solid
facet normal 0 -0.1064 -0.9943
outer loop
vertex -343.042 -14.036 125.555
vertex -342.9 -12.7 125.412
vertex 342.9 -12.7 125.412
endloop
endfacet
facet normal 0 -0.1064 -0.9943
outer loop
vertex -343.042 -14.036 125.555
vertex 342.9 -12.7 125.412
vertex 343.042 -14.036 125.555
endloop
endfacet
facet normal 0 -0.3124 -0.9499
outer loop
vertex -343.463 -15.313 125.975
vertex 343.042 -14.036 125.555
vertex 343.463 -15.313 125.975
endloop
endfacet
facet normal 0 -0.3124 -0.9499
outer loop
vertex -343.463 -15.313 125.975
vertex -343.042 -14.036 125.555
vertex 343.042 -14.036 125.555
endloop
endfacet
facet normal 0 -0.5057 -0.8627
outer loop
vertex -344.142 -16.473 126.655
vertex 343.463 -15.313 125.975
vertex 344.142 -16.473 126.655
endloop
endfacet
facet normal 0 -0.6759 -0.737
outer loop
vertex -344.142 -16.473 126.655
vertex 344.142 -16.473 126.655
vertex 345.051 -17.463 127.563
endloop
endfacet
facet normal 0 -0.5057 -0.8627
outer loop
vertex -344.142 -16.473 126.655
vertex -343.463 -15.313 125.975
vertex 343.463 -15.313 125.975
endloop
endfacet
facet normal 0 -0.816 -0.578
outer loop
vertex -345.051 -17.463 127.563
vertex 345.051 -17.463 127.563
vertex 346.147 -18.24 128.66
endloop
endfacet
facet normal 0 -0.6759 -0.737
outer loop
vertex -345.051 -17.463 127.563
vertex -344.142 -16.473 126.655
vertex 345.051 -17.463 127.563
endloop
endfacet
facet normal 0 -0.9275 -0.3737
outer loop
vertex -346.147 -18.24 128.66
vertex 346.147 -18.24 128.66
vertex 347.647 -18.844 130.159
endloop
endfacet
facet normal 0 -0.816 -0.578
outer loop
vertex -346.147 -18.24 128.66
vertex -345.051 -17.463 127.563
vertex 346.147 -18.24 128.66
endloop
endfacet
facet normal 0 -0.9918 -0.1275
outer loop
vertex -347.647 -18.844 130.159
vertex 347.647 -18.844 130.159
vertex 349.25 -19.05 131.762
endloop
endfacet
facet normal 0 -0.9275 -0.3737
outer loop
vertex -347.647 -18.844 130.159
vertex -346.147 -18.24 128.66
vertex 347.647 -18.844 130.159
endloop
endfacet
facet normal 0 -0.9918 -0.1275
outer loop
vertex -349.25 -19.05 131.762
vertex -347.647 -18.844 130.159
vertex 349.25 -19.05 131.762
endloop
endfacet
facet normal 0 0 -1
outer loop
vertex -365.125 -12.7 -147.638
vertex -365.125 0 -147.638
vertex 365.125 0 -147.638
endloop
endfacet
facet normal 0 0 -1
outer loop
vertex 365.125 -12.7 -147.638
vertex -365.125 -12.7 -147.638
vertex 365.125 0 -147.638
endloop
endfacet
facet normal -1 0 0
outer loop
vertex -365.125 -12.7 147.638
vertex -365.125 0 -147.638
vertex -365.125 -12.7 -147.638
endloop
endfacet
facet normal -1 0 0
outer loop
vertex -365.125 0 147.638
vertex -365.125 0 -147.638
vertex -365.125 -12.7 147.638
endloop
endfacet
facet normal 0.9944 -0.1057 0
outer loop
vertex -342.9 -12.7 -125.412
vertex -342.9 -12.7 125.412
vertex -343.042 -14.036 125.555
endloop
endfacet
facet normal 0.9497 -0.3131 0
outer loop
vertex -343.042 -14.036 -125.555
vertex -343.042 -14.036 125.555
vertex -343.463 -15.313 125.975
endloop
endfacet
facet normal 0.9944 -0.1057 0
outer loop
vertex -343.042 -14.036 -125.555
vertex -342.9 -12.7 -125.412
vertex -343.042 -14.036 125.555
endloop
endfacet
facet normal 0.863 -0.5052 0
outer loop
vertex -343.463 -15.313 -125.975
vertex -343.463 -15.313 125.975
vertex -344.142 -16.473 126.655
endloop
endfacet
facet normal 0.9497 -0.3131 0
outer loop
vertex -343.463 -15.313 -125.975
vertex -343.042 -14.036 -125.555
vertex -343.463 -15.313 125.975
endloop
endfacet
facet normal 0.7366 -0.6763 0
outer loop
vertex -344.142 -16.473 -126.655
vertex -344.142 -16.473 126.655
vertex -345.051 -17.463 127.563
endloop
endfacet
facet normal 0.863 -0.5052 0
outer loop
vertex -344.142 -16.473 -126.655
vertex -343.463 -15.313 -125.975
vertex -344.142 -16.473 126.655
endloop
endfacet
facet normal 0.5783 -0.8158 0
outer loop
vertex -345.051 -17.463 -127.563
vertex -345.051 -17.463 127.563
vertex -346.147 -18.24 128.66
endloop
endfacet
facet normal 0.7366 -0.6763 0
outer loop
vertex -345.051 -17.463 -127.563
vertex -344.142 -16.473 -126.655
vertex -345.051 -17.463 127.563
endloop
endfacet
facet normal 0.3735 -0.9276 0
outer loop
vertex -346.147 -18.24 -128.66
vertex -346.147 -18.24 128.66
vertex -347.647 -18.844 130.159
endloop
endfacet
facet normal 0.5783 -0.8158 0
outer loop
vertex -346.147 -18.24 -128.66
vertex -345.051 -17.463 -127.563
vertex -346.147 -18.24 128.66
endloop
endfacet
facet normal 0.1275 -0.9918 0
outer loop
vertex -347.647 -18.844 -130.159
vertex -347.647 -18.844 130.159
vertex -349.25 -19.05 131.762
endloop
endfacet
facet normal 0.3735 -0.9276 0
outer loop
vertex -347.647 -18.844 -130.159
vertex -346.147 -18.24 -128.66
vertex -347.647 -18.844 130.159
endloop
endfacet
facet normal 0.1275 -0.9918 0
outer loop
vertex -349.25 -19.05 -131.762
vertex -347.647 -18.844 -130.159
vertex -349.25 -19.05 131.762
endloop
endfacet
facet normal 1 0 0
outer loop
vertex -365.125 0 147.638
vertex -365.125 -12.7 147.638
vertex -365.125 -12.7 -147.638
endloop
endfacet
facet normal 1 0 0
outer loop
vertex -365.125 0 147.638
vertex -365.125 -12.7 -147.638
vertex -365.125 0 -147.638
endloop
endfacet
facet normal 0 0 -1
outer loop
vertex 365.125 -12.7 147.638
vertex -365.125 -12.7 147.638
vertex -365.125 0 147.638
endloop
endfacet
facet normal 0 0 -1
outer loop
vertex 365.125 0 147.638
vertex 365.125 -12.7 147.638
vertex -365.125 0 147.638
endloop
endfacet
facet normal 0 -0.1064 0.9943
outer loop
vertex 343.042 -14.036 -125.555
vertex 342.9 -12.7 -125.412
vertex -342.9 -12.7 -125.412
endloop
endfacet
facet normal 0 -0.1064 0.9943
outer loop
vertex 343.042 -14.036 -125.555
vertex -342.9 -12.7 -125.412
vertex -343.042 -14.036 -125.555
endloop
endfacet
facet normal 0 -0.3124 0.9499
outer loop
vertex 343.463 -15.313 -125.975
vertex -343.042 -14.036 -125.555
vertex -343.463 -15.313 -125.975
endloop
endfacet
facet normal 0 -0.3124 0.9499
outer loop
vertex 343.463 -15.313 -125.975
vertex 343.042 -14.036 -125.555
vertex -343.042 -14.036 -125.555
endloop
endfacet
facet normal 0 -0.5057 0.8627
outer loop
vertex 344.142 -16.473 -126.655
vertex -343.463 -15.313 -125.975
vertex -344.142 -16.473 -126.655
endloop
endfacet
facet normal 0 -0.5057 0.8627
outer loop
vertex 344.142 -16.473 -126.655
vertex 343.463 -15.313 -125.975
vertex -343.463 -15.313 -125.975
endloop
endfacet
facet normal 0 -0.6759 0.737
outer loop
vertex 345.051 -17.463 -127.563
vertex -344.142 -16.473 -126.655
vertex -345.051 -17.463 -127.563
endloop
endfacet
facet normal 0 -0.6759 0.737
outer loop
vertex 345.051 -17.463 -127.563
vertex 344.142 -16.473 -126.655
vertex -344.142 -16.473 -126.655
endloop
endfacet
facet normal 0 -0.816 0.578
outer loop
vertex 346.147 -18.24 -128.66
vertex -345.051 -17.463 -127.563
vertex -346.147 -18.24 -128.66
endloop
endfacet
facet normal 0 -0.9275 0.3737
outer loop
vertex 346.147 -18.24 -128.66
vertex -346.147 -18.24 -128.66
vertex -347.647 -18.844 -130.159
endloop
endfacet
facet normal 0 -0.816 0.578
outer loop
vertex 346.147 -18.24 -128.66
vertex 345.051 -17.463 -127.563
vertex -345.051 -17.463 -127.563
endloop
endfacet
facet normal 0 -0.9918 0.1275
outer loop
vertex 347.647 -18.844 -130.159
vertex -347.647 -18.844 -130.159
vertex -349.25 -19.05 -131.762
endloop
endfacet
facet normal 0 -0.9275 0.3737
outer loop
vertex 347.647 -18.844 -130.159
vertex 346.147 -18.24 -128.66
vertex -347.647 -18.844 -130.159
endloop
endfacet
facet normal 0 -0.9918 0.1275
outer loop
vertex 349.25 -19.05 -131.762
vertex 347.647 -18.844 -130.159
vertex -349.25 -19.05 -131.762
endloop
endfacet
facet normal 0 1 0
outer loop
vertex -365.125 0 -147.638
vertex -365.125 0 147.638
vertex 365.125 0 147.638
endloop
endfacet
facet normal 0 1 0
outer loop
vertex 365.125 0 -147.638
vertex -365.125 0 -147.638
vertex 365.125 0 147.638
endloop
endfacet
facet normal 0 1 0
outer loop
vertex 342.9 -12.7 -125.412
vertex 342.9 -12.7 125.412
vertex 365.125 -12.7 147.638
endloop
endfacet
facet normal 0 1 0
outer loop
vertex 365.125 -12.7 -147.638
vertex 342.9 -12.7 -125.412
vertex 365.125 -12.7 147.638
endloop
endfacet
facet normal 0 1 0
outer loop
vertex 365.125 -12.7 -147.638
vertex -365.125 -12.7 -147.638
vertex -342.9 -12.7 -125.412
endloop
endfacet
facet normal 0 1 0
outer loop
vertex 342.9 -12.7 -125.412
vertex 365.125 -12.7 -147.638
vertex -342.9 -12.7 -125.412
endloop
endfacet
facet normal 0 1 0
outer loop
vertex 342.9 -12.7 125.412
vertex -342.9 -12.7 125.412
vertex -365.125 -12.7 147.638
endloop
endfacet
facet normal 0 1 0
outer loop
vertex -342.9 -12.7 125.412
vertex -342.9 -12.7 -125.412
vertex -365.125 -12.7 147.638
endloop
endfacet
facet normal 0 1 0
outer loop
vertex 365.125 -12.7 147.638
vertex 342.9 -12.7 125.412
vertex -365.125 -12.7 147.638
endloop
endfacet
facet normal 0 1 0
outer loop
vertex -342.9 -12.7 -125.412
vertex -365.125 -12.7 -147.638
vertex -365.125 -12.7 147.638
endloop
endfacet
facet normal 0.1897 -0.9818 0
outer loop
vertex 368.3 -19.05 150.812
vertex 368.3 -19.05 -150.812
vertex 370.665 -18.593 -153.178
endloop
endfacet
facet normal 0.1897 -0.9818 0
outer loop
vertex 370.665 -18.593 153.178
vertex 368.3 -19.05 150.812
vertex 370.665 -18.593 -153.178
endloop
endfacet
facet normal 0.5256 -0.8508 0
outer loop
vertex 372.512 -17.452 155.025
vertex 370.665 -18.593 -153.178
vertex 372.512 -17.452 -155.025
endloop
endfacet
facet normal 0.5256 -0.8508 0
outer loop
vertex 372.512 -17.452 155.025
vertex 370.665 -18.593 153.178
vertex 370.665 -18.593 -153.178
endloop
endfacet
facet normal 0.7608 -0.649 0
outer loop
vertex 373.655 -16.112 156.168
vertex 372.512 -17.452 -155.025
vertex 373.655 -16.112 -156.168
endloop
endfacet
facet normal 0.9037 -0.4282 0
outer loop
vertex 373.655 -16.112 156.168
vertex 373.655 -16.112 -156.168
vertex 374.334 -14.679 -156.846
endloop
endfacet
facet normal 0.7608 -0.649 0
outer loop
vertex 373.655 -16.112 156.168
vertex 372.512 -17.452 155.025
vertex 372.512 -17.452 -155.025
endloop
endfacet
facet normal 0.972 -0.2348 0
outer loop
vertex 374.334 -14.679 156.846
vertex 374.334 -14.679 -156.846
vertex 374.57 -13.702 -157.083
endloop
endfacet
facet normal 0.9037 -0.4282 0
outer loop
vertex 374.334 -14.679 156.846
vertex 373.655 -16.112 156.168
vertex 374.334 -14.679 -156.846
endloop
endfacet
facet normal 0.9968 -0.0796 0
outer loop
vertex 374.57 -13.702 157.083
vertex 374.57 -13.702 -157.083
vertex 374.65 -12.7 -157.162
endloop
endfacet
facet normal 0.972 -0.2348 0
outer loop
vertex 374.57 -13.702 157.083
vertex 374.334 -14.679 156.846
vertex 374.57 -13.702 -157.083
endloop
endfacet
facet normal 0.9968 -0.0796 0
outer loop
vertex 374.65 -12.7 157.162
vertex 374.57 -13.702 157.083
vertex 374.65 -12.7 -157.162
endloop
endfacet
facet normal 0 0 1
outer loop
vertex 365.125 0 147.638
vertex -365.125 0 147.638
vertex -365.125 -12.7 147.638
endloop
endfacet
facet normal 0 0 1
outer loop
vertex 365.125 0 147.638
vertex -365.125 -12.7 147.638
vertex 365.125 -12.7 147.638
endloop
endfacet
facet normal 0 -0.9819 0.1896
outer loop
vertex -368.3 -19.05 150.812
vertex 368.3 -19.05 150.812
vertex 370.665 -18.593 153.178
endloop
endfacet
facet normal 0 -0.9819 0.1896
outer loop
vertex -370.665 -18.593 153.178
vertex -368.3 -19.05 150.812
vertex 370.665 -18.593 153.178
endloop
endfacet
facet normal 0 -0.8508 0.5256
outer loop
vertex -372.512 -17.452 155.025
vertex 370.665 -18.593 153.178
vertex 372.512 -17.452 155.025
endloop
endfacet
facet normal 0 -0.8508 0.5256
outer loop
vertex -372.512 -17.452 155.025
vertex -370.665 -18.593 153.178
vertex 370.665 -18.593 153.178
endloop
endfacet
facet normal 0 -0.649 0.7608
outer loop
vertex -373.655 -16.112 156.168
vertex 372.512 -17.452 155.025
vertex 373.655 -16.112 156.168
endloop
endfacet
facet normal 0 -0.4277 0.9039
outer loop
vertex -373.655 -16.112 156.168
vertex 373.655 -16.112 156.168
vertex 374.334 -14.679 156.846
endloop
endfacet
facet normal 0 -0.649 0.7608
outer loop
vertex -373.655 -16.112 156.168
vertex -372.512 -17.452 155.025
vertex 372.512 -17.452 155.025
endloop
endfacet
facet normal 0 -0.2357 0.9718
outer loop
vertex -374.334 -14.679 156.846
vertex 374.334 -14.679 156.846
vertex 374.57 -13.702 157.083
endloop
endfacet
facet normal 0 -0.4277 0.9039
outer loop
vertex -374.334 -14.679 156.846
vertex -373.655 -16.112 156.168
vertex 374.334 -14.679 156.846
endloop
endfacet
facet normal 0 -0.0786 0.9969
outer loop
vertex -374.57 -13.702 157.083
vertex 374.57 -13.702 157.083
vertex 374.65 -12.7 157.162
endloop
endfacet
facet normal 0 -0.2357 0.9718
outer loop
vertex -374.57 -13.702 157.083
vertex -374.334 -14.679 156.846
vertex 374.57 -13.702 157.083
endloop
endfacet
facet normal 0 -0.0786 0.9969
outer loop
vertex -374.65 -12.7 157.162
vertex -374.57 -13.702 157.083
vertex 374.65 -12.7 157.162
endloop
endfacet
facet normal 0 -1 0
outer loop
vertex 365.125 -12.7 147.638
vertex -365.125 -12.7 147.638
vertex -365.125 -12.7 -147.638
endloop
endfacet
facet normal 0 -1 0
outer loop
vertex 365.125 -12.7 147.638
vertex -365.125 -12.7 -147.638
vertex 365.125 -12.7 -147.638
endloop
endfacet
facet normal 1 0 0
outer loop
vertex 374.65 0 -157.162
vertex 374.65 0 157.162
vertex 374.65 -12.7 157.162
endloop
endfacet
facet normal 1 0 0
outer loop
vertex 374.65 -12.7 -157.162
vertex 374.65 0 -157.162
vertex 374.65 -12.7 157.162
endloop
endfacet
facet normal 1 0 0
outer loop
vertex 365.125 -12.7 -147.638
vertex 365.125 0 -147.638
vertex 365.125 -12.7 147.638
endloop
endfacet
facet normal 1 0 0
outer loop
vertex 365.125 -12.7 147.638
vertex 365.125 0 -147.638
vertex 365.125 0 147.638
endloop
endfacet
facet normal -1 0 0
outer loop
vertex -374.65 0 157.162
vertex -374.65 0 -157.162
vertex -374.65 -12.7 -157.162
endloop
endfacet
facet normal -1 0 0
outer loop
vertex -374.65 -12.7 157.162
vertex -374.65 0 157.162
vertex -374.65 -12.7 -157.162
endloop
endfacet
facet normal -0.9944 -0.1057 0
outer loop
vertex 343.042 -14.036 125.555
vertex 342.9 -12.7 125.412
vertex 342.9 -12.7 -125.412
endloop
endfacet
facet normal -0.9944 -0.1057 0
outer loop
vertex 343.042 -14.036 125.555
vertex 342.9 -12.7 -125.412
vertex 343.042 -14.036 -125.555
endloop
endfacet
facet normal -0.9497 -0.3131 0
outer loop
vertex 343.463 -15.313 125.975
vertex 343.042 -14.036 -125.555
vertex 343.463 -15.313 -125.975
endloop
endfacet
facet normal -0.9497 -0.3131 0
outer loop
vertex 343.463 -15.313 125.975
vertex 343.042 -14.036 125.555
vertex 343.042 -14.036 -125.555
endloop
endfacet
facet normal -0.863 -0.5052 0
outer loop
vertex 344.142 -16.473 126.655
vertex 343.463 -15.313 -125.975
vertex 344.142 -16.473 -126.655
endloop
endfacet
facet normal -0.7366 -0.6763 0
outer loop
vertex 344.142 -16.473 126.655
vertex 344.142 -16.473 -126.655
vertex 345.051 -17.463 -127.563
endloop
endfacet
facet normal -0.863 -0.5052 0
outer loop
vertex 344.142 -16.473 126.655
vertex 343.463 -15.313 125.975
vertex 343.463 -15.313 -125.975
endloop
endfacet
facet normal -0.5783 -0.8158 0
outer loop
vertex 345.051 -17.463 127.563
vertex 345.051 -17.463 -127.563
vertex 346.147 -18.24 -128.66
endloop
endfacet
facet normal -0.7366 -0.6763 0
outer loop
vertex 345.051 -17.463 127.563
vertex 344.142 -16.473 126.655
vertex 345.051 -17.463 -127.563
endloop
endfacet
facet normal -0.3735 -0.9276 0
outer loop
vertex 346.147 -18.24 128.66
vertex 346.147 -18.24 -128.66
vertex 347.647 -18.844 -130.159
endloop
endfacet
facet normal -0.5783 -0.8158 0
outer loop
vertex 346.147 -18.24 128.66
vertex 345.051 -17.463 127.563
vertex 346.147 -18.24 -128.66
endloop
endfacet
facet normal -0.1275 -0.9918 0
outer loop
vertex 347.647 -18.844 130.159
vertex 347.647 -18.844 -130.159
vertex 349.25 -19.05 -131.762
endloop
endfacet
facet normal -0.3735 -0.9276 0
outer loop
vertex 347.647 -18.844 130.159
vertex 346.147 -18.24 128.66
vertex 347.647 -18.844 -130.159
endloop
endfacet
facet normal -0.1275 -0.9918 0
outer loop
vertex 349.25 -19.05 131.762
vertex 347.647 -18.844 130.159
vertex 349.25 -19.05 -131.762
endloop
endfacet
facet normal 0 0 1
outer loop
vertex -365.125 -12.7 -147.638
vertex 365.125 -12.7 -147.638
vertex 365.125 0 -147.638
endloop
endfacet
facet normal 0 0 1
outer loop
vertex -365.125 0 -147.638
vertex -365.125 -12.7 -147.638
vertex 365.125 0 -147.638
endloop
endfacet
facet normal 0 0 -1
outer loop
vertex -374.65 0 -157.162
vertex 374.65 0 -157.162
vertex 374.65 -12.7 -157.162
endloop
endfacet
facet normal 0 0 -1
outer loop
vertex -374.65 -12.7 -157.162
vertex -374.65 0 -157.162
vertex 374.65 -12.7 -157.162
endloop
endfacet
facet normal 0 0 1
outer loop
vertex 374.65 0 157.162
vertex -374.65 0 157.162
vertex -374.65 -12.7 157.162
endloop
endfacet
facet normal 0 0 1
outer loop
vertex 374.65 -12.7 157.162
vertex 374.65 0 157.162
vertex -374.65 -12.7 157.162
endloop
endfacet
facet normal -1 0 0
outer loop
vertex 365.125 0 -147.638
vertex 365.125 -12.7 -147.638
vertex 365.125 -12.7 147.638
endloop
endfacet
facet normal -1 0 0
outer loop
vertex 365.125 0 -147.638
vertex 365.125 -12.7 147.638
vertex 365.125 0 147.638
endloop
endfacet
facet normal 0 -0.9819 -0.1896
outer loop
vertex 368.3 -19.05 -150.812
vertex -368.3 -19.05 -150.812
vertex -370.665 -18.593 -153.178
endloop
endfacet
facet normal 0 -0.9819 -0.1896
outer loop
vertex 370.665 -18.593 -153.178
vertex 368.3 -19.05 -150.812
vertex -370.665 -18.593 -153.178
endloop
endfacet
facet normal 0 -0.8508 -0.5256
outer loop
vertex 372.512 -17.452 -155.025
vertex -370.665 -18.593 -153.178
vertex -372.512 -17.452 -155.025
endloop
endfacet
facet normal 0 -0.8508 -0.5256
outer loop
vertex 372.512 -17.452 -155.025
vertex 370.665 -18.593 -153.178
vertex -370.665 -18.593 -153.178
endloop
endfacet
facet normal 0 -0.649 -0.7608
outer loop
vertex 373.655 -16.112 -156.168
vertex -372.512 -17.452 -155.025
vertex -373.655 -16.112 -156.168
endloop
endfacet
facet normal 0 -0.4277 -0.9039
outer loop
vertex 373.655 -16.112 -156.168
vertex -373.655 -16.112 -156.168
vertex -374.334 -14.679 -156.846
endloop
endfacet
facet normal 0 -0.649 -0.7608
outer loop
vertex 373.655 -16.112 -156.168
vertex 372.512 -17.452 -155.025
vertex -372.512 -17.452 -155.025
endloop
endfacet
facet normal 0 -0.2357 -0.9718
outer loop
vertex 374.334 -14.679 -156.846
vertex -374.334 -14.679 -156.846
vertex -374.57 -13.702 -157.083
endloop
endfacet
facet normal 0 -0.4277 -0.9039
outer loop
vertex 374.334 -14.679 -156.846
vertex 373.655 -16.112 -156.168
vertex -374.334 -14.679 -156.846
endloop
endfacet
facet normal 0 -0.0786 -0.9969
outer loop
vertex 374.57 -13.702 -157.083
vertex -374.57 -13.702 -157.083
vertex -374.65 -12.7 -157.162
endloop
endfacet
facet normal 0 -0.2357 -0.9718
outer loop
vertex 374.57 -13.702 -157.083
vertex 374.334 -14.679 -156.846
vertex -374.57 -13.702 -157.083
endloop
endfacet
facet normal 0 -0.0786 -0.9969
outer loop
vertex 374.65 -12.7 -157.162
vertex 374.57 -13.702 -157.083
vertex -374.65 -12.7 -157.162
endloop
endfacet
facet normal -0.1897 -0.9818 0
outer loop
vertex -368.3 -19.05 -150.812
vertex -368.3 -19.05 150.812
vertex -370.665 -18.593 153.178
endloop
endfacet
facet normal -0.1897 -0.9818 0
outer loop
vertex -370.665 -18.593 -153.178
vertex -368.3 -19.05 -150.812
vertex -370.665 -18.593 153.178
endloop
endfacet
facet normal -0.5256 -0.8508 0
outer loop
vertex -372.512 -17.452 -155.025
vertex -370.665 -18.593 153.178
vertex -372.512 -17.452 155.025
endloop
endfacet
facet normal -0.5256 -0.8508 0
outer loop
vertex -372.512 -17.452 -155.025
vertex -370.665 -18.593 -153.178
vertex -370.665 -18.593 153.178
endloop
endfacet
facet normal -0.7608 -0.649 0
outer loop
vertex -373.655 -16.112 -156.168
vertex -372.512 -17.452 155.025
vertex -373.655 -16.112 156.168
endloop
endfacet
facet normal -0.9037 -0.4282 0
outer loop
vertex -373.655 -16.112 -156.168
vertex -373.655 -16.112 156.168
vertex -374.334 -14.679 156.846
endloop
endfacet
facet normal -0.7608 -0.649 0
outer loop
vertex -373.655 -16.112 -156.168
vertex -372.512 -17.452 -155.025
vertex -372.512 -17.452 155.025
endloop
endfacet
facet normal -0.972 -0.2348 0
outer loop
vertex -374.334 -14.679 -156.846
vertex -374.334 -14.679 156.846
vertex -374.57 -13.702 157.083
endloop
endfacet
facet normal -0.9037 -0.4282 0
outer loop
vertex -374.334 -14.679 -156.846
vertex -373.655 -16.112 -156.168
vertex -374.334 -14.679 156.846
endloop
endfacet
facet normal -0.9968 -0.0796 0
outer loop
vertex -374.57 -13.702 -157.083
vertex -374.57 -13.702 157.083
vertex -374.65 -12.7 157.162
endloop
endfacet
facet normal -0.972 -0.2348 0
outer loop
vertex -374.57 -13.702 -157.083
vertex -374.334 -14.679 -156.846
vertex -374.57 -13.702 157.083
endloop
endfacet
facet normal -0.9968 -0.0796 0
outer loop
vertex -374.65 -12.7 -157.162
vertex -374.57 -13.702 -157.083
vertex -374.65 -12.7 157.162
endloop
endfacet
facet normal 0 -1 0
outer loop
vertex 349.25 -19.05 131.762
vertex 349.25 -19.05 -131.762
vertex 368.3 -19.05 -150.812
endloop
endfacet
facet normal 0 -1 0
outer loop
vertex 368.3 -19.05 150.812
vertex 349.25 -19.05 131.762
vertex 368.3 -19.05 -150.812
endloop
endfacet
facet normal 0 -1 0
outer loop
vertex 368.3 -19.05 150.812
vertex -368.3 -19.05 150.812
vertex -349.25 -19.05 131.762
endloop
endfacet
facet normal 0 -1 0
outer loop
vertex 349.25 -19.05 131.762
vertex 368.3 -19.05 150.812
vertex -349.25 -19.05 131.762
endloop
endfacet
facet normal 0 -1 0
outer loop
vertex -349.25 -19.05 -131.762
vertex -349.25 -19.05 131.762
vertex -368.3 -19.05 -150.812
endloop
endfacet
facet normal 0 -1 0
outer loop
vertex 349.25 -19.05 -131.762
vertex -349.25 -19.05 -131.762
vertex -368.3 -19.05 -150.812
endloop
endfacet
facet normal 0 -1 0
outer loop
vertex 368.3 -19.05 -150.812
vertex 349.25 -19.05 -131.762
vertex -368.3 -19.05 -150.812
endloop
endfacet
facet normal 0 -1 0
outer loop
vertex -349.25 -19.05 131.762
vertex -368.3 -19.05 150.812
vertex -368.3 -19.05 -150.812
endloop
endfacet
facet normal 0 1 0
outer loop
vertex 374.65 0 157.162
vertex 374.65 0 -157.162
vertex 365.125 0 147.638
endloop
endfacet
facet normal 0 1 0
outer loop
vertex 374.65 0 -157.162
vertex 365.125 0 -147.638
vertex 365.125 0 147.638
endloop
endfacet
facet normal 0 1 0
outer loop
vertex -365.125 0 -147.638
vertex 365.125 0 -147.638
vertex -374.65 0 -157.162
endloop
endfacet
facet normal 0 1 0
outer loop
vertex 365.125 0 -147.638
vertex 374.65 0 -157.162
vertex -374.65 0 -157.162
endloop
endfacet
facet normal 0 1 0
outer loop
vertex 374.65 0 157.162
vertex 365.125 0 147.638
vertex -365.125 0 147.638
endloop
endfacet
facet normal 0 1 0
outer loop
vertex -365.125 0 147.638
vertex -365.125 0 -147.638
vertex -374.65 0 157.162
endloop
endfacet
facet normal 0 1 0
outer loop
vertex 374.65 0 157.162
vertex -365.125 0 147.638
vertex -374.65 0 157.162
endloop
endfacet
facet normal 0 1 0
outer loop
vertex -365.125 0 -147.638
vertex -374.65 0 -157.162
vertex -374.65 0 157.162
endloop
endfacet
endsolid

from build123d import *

# Parameters (mm, degrees)
F0_W     = 730.25
F0_H     = 295.275
F1_DEPTH = 12.7


with BuildPart() as f1:
    # F0 (on Front) → F1 (new body)
    with BuildSketch(Plane.XZ):
        Rectangle(F0_W, F0_H)
    extrude(amount=F1_DEPTH)


with BuildPart() as f3:
    # F3: sweep along a path in F3_path
    with BuildLine(Plane(origin=(365.125, -12.7, 147.6375), x_dir=(0, 0, -1), z_dir=(0, 1, 0))) as f3_path:
        Line((0, 0), (0, 730.25))
        Line((0, 730.25), (295.275, 730.25))
        Line((295.275, 730.25), (295.275, 0))
        Line((295.275, 0), (0, 0))
    # F2 (on face) → F3 (sweep)
    with BuildSketch(Plane.YZ.offset(365.125)):
        with BuildLine():
            Line((-12.7, 147.6375), (0, 147.6375))
            Line((0, 147.6375), (0, 157.1625))
            Line((0, 157.1625), (-12.7, 157.1625))
            ThreePointArc((-12.7, 157.1625), (-17.1901280605, 155.3026280605), (-19.05, 150.8125))
            Line((-19.05, 150.8125), (-19.05, 131.7625))
            ThreePointArc((-19.05, 131.7625), (-17.1901280605, 127.2723719395), (-12.7, 125.4125))
            Line((-12.7, 125.4125), (-12.7, 147.6375))
        make_face()
    sweep(path=f3_path.line, transition=Transition.RIGHT)


solid = Compound([f1.part, f3.part])
